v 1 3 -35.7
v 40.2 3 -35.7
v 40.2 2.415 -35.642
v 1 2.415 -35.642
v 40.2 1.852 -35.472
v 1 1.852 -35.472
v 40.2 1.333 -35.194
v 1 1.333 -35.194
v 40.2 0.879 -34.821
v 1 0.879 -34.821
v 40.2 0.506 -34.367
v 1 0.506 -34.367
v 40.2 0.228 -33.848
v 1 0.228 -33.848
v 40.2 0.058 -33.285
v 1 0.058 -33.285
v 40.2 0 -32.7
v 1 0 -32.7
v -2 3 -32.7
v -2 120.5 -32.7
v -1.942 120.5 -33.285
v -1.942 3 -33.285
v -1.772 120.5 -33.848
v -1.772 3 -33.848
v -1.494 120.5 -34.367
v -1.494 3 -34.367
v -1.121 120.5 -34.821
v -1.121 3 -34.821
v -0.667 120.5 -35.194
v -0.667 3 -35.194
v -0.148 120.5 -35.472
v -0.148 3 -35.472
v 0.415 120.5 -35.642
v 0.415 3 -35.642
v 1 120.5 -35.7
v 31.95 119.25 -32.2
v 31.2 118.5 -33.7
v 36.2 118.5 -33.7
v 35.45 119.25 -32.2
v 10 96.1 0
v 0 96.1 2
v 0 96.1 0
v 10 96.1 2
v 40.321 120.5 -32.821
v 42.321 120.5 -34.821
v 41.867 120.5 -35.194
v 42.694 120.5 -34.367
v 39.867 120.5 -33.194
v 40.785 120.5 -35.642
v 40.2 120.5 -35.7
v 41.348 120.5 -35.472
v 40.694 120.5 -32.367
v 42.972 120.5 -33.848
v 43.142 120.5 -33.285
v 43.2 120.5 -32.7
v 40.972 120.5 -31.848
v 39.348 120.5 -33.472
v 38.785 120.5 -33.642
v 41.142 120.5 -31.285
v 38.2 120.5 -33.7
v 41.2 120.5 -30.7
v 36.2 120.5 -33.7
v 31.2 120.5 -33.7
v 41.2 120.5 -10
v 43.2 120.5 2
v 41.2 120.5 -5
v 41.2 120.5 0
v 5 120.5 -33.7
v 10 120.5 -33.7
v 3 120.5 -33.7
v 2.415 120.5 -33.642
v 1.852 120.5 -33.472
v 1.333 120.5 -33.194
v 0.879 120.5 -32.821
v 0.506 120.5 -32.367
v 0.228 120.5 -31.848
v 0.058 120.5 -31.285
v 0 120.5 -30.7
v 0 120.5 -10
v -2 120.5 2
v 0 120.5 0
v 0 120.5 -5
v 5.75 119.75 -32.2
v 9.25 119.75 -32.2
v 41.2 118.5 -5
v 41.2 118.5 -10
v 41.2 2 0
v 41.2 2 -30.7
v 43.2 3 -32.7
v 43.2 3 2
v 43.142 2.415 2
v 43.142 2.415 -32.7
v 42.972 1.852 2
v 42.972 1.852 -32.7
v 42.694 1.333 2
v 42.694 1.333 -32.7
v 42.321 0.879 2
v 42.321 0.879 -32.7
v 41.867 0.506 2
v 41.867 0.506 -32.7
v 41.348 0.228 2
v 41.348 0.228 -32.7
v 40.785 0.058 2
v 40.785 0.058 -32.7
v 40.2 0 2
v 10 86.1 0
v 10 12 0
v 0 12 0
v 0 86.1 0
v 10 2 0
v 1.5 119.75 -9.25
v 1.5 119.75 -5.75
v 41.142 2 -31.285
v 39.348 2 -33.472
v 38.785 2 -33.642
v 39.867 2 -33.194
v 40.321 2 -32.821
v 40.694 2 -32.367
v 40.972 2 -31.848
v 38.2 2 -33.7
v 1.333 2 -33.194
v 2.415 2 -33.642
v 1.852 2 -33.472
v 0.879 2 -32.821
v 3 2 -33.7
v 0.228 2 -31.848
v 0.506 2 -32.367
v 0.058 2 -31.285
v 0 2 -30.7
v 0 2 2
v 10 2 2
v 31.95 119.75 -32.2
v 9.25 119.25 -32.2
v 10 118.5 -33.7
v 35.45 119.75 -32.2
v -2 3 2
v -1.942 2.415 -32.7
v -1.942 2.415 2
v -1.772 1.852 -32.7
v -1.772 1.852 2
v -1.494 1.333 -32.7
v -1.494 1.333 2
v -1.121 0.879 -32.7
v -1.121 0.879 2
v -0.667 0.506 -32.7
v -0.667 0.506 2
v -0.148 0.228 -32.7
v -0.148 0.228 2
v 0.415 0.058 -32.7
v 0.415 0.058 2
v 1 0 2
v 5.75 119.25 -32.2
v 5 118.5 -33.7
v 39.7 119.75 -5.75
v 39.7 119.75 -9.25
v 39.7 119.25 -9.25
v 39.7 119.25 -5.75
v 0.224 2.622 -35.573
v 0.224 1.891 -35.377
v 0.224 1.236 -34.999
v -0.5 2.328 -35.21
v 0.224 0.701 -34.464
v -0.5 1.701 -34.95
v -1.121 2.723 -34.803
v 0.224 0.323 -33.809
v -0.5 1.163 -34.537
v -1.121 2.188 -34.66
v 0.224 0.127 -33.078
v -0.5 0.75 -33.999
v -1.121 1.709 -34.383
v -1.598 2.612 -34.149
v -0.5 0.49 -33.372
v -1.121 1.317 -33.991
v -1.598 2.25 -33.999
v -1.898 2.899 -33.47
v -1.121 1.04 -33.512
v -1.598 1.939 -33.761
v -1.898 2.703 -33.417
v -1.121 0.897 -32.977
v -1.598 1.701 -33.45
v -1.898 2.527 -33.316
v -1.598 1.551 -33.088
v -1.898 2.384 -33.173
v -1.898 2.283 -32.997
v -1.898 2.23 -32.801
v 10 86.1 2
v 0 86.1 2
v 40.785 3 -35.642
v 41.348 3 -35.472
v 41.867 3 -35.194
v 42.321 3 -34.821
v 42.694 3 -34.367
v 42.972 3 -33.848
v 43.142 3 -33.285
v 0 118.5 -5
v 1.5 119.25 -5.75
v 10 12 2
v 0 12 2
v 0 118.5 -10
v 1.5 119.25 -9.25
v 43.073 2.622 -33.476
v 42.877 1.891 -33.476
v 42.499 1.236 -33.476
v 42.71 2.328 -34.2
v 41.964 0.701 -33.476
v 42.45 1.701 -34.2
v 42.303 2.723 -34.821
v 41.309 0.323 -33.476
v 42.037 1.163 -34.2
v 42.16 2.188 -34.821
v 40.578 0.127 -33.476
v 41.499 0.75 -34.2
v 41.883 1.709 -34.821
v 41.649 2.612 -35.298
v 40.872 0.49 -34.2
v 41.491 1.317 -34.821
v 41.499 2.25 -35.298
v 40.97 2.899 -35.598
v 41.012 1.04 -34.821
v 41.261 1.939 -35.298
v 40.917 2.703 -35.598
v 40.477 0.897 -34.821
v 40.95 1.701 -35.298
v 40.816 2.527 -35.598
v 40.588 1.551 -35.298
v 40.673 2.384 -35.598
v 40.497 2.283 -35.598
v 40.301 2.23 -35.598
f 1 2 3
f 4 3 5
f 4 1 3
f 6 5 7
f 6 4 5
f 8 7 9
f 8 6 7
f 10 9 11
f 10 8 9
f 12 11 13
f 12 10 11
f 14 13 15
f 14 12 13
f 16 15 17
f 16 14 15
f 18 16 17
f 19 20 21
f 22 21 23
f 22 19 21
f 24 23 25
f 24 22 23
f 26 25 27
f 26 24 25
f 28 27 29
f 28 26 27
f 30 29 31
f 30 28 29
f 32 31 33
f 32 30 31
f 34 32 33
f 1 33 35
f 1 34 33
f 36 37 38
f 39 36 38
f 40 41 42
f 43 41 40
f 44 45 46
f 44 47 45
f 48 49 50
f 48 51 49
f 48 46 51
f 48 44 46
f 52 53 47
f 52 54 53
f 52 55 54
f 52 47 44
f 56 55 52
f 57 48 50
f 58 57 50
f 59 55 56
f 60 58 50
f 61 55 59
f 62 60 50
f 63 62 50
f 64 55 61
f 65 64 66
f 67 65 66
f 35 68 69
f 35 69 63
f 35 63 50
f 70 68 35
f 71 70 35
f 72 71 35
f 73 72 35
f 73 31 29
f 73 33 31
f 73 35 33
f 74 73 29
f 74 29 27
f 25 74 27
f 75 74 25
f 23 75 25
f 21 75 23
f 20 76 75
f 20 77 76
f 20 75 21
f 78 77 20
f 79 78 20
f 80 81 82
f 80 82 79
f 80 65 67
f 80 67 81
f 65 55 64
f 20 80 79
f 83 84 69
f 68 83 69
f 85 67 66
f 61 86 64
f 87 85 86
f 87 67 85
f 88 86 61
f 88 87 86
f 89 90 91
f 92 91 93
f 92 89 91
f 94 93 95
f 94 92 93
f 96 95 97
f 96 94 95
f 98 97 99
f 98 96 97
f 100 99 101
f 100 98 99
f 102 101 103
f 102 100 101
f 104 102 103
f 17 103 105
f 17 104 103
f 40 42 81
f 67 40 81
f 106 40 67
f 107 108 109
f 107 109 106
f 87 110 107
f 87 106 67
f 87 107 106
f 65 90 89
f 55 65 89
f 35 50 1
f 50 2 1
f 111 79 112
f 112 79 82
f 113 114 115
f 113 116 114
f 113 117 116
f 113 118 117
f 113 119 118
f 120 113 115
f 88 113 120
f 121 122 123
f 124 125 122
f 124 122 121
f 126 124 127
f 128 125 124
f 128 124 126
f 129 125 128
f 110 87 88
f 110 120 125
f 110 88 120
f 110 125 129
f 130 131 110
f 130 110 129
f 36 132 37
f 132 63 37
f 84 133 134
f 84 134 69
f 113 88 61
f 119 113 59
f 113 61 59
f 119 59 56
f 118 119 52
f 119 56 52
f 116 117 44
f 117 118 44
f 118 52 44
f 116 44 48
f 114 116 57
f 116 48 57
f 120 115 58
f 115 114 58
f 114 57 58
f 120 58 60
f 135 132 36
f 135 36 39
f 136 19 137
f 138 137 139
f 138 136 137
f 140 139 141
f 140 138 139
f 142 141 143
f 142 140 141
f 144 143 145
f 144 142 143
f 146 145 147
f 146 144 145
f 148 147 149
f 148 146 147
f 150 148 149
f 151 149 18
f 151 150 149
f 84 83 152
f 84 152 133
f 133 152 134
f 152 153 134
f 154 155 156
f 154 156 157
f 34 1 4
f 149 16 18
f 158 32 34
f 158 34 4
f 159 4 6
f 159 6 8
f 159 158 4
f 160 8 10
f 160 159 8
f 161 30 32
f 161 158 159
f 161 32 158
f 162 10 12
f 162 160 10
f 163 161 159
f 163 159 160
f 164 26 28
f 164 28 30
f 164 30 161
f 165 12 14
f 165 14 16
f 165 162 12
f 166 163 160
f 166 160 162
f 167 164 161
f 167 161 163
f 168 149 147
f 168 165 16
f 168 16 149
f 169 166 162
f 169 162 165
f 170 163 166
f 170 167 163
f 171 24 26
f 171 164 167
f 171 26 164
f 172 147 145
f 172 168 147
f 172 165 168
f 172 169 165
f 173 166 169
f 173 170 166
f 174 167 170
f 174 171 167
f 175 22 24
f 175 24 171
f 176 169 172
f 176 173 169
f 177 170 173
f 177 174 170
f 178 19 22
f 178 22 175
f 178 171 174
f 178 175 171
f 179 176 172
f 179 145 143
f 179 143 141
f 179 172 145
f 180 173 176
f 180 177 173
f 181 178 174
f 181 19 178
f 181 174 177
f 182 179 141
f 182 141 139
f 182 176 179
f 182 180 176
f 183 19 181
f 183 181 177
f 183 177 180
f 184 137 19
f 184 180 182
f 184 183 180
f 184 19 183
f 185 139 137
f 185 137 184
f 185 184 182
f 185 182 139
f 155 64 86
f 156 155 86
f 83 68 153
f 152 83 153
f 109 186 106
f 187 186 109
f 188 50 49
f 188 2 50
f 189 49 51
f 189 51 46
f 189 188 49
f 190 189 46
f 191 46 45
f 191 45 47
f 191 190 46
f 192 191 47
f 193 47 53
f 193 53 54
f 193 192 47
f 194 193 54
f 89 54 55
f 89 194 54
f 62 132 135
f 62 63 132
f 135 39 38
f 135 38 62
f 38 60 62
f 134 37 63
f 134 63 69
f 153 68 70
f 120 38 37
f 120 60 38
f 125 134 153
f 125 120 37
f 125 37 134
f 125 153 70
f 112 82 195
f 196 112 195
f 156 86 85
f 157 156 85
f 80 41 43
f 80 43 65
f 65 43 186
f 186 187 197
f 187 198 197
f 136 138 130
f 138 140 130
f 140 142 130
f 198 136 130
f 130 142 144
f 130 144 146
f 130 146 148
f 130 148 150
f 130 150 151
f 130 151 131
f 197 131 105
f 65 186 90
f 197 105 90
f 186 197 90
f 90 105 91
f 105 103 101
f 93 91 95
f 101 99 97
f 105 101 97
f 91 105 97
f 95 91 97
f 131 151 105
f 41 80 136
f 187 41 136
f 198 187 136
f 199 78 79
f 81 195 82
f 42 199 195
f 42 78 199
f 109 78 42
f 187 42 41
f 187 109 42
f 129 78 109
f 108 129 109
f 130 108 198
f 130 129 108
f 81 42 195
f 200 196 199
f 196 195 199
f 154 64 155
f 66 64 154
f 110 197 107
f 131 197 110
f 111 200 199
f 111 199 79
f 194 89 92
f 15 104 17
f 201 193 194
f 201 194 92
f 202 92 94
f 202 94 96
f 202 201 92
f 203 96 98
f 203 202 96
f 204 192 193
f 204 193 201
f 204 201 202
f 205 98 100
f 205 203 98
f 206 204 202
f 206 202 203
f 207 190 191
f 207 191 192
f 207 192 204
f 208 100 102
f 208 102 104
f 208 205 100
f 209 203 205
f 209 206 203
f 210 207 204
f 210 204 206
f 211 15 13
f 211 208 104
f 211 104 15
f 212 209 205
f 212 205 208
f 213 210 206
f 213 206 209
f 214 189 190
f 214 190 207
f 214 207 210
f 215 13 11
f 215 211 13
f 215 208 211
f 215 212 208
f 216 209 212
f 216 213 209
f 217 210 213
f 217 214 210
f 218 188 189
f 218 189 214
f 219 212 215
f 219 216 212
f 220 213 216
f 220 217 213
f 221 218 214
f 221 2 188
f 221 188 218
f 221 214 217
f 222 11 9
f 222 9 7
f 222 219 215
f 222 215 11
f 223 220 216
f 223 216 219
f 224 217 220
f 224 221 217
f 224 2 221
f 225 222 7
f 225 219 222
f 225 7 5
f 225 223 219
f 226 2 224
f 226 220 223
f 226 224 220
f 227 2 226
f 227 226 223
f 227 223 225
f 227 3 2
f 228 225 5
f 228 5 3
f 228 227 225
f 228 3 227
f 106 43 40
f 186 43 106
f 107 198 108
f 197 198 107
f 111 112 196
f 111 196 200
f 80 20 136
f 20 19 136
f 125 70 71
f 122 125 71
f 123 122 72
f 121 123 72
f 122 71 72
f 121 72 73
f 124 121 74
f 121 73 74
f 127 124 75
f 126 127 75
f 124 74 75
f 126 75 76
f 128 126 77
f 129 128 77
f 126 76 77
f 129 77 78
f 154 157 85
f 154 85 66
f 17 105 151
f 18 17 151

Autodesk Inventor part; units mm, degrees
ref_plane "YZ Plane" through (0, 0, 0) normal (1, 0, 0) x (0, 1, 0)
sketch "Sketch1" plane through (0, 0, 0) normal (0, 1, 0) x (-1, 0, 0)
  line L0 (0, 0) -> (-41.2, 0)
  line L1 (-41.2, 0) -> (-41.2, -33.7)
  line L2 (-41.2, -33.7) -> (0, -33.7)
  line L3 (0, -33.7) -> (0, 0)
  line L4 (2, 2) -> (-43.2, 2)
  line L5 (-43.2, 2) -> (-43.2, -35.7)
  line L6 (-43.2, -35.7) -> (2, -35.7)
  line L7 (2, -35.7) -> (2, 2)
  dimension "d0" = 33.7
  dimension "d1" = 41.2
  dimension "d2" = 2
  dimension "d3" = 2
  dimension "d4" = 2
  dimension "d5" = 2
extrude "Extrusion1" add sketch "Sketch1" along normal blind 2 contours L3 L2 L1 L0
extrude "Extrusion2" add sketch "Sketch1" along normal blind 120.5
sketch "Sketch2" plane through (41.2, 2, 0) normal (0, 0, -1) x (-1, 0, 0)
  line L0 (43.2, 118.5) -> (-2, 118.5) projected
  line L1 (36.2, 118.5) -> (31.2, 118.5)
  line L2 (31.2, 118.5) -> (31.2, 116.5)
  line L3 (31.2, 116.5) -> (36.2, 116.5)
  line L4 (36.2, 116.5) -> (36.2, 118.5)
  line L5 (41.2, 0) -> (41.2, 118.5) projected
  point P0 (41.2, -2)
  point P1 (31.2, 118.5)
  dimension "d10" = 5
  dimension "d11" = 2
  dimension "d12" = 5
sketch "Sketch3" plane through (41.2, 2, 0) normal (-1, 0, 0) x (0, 0, 1)
  point P0 (0, -2)
sketch "Sketch4" plane through (41.2, 2, 0) normal (-1, 0, 0) x (0, 0, 1)
  line L0 (2, 118.5) -> (-35.7, 118.5) projected
  line L1 (-5, 118.5) -> (-10, 118.5)
  line L2 (-10, 118.5) -> (-10, 116.5)
  line L3 (-10, 116.5) -> (-5, 116.5)
  line L4 (-5, 116.5) -> (-5, 118.5)
  line L5 (0, 0) -> (0, 118.5) projected
  point P0 (0, -2)
  dimension "d27" = 5
  dimension "d28" = 2
  dimension "d29" = 5
extrude "Extrusion4" add sketch "Sketch4" along normal blind 1.5
chamfer "Chamfer5" distance 0.75 distance2 1.5 1 edges at (39.7, 120.5, -7.5) measured on face at (39.7, 119.1667, -6.6667)
chamfer "Chamfer6" distance 0.75 distance2 1.5 1 edges at (39.7, 119.125, -10) measured on face at (39.7, 118.9167, -6.6667)
chamfer "Chamfer7" distance 0.75 distance2 1.5 1 edges at (39.7, 118.5, -7.1251) measured on face at (39.7, 119.3333, -7.8334)
chamfer "Chamfer8" distance 0.75 distance2 1.5 1 edges at (39.7, 119.5, -5) measured on face at (39.7, 119.5833, -6.4167)
sketch "Sketch5" plane through (0, 2, -33.7) normal (0, 0, 1) x (1, 0, 0)
  line L0 (0, 118.5) -> (41.2, 118.5) projected
  line L1 (36.2, 118.5) -> (31.2, 118.5)
  line L2 (31.2, 118.5) -> (31.2, 116.5)
  line L3 (31.2, 116.5) -> (36.2, 116.5)
  line L4 (36.2, 116.5) -> (36.2, 118.5)
  line L5 (41.2, 0) -> (41.2, 118.5) projected
  point P0 (0, -2)
  point P1 (31.2, 118.5)
  dimension "d45" = 5
  dimension "d46" = 2
  dimension "d47" = 5
extrude "Extrusion5" add sketch "Sketch5" along normal blind 1.5
chamfer "Chamfer9" distance 0.75 distance2 1.5 1 edges at (33.7, 120.5, -32.2) measured on face at (34.5333, 119.1667, -32.2)
chamfer "Chamfer10" distance 0.75 distance2 1.5 1 edges at (33.7, 118.5, -32.2) measured on face at (34.5333, 118.9167, -32.2)
chamfer "Chamfer11" distance 0.75 distance2 1.5 1 edges at (31.2, 119.4999, -32.2) measured on face at (34.5333, 119.4166, -32.2)
chamfer "Chamfer12" distance 0.75 distance2 1.5 1 edges at (36.2, 119.4999, -32.2) measured on face at (34.7833, 119.4166, -32.2)
ref_plane "Work Plane2" through (17.8, 0, -35.7) normal (-1, 0, 0) x (0, 0, 1)
ref_plane "Work Plane3" through (20.6, 0, 2) normal (1, 0, 0) x (0, 0, -1)
mirror "Mirror1" about plane through (20.6, 0, 2) normal (1, 0, 0) of "Extrusion5", "Extrusion4", "Chamfer5", "Chamfer8", "Chamfer7", "Chamfer9", "Chamfer11", "Chamfer10", "Chamfer12", "Chamfer6"
fillet "Fillet2" radius 3 3 edges at (-2, 0, -16.85) (20.6, 0, -35.7) (43.2, 0, -16.85)
fillet "Fillet3" radius 3 4 edges at (-1.1213, 0.8787, -34.8213) (-2, 61.75, -35.7) (42.3213, 0.8787, -34.8213) (43.2, 61.75, -35.7)
fillet "Fillet4" radius 3 2 edges at (0, 61.25, -33.7) (41.2, 61.25, -33.7)
sketch "Sketch10" plane through (-2, 120.5, 2) normal (0, 0, 1) x (1, 0, 0)
  line L0 (2, -24.4) -> (12, -24.4)
  line L1 (12, -24.4) -> (12, -34.4)
  line L2 (12, -34.4) -> (2, -34.4)
  line L3 (2, -34.4) -> (2, -24.4)
  line L4 (3, -120.5) -> (42.2, -120.5) projected
  line L5 (2, -118.5) -> (2, 0) projected
  line L6 (0, 0) -> (45.2, 0) projected
  point P0 (2, -120.5)
  dimension "d88" = 10
  dimension "d89" = 10
  dimension "d90" = 24.4
extrude "Extrusion10" cut sketch "Sketch10" against normal blind 10
sketch "Sketch11" plane through (-2, 120.5, 2) normal (0, 0, 1) x (1, 0, 0)
  line L0 (2, -108.5) -> (12, -108.5)
  line L1 (12, -108.5) -> (12, -118.5)
  line L2 (12, -118.5) -> (2, -118.5)
  line L3 (2, -118.5) -> (2, -108.5)
  line L4 (0, -117.5) -> (0, 0) projected
  line L5 (3, -120.5) -> (42.2, -120.5) projected
  point P0 (2, -120.5)
  dimension "d95" = 2
  dimension "d96" = 2
  dimension "d97" = 10
  dimension "d98" = 10
extrude "Extrusion11" cut sketch "Sketch11" against normal blind 10
sketch "Sketch12" plane through (43.2, 3, 2) normal (1, 0, 0) x (0, 0, -1)
  line L0 (26.35, 103.4808) -> (11.35, 107.5)
  arc A0 (25.4441, 100.1) -> (26.35, 103.4808) centre (25.8971, 101.7904) ccw
  line L1 (25.4441, 100.1) -> (10.4441, 104.1193)
  arc A1 (11.35, 107.5) -> (10.4441, 104.1193) centre (10.8971, 105.8096) ccw
  line L2 (0, 117.5) -> (34.7, 117.5) projected
  line L3 (0, 117.5) -> (37.7, 117.5)
  line L4 (10.4441, 104.1193) -> (10.4441, 103.1193)
  line L5 (37.7, 0) -> (37.7, 117.5) projected
  line L6 (26.35, 87.9641) -> (11.35, 91.9833)
  arc A2 (25.4441, 84.5834) -> (26.35, 87.9641) centre (25.8971, 86.2737) ccw
  line L7 (25.4441, 84.5834) -> (10.4441, 88.6026)
  arc A3 (11.35, 91.9833) -> (10.4441, 88.6026) centre (10.8971, 90.293) ccw
  line L8 (10.4441, 88.6026) -> (10.4441, 87.6026)
  line L9 (26.35, 72.4474) -> (11.35, 76.4667)
  arc A4 (25.4441, 69.0667) -> (26.35, 72.4474) centre (25.8971, 70.7571) ccw
  line L10 (25.4441, 69.0667) -> (10.4441, 73.0859)
  arc A5 (11.35, 76.4667) -> (10.4441, 73.0859) centre (10.8971, 74.7763) ccw
  line L11 (10.4441, 73.0859) -> (10.4441, 72.0859)
  line L12 (26.35, 56.9308) -> (11.35, 60.95)
  arc A6 (25.4441, 53.55) -> (26.35, 56.9308) centre (25.8971, 55.2404) ccw
  line L13 (25.4441, 53.55) -> (10.4441, 57.5692)
  arc A7 (11.35, 60.95) -> (10.4441, 57.5692) centre (10.8971, 59.2596) ccw
  line L14 (10.4441, 57.5692) -> (10.4441, 56.5692)
  line L15 (26.35, 41.4141) -> (11.35, 45.4333)
  arc A8 (25.4441, 38.0333) -> (26.35, 41.4141) centre (25.8971, 39.7237) ccw
  line L16 (25.4441, 38.0333) -> (10.4441, 42.0526)
  arc A9 (11.35, 45.4333) -> (10.4441, 42.0526) centre (10.8971, 43.7429) ccw
  line L17 (10.4441, 42.0526) -> (10.4441, 41.0526)
  line L18 (26.35, 25.8974) -> (11.35, 29.9166)
  arc A10 (25.4441, 22.5167) -> (26.35, 25.8974) centre (25.8971, 24.207) ccw
  line L19 (25.4441, 22.5167) -> (10.4441, 26.5359)
  arc A11 (11.35, 29.9166) -> (10.4441, 26.5359) centre (10.8971, 28.2263) ccw
  line L20 (10.4441, 26.5359) -> (10.4441, 25.5359)
  line L21 (26.35, 10.3807) -> (11.35, 14.4)
  arc A12 (25.4441, 7) -> (26.35, 10.3807) centre (25.8971, 8.6904) ccw
  line L22 (25.4441, 7) -> (10.4441, 11.0192)
  arc A13 (11.35, 14.4) -> (10.4441, 11.0192) centre (10.8971, 12.7096) ccw
  line L23 (10.4441, 11.0192) -> (10.4441, 10.0192)
  line L24 (0, -3) -> (34.7, -3) projected
  point P0 (18.85, 105.4904)
  point P1 (18.85, 117.5)
  point P2 (18.85, 89.9737)
  point P3 (18.85, 74.457)
  point P4 (18.85, 58.9404)
  point P5 (18.85, 43.4237)
  point P6 (18.85, 27.907)
  point P7 (18.85, 12.3904)
  dimension "d113" = 15
  dimension "d114" = 3.5
  dimension "d115" = 1
  dimension "d116" = 75
  dimension "d117" = 10
  dimension "d120" = 15.5167
  dimension "d125" = 10
extrude "Extrusion12" [suppressed]
sketch "Sketch13" plane through (-2, 3, 2) normal (-1, 0, 0) x (0, 0, 1)
  line L0 (-9.85, 103.4808) -> (-24.85, 107.5)
  arc A0 (-10.7559, 100.1) -> (-9.85, 103.4808) centre (-10.3029, 101.7904) ccw
  line L1 (-10.7559, 100.1) -> (-25.7559, 104.1193)
  arc A1 (-24.85, 107.5) -> (-25.7559, 104.1193) centre (-25.3029, 105.8096) ccw
  line L2 (-25.7559, 104.1193) -> (-25.7559, 103.1193)
  line L3 (0, -3) -> (0, 117.5)
  line L4 (-9.85, 87.9641) -> (-24.85, 91.9833)
  arc A2 (-10.7559, 84.5834) -> (-9.85, 87.9641) centre (-10.3029, 86.2737) ccw
  line L5 (-10.7559, 84.5834) -> (-25.7559, 88.6026)
  arc A3 (-24.85, 91.9833) -> (-25.7559, 88.6026) centre (-25.3029, 90.293) ccw
  line L6 (-25.7559, 88.6026) -> (-25.7559, 87.6026)
  line L7 (-9.85, 72.4474) -> (-24.85, 76.4667)
  arc A4 (-10.7559, 69.0667) -> (-9.85, 72.4474) centre (-10.3029, 70.7571) ccw
  line L8 (-10.7559, 69.0667) -> (-25.7559, 73.0859)
  arc A5 (-24.85, 76.4667) -> (-25.7559, 73.0859) centre (-25.3029, 74.7763) ccw
  line L9 (-25.7559, 73.0859) -> (-25.7559, 72.0859)
  line L10 (-9.85, 56.9308) -> (-24.85, 60.95)
  arc A6 (-10.7559, 53.55) -> (-9.85, 56.9308) centre (-10.3029, 55.2404) ccw
  line L11 (-10.7559, 53.55) -> (-25.7559, 57.5692)
  arc A7 (-24.85, 60.95) -> (-25.7559, 57.5692) centre (-25.3029, 59.2596) ccw
  line L12 (-25.7559, 57.5692) -> (-25.7559, 56.5692)
  line L13 (-9.85, 41.4141) -> (-24.85, 45.4333)
  arc A8 (-10.7559, 38.0333) -> (-9.85, 41.4141) centre (-10.3029, 39.7237) ccw
  line L14 (-10.7559, 38.0333) -> (-25.7559, 42.0526)
  arc A9 (-24.85, 45.4333) -> (-25.7559, 42.0526) centre (-25.3029, 43.7429) ccw
  line L15 (-25.7559, 42.0526) -> (-25.7559, 41.0526)
  line L16 (-9.85, 25.8974) -> (-24.85, 29.9166)
  arc A10 (-10.7559, 22.5167) -> (-9.85, 25.8974) centre (-10.3029, 24.207) ccw
  line L17 (-10.7559, 22.5167) -> (-25.7559, 26.5359)
  arc A11 (-24.85, 29.9166) -> (-25.7559, 26.5359) centre (-25.3029, 28.2263) ccw
  line L18 (-25.7559, 26.5359) -> (-25.7559, 25.5359)
  line L19 (-9.85, 10.3807) -> (-24.85, 14.4)
  arc A12 (-10.7559, 7) -> (-9.85, 10.3807) centre (-10.3029, 8.6904) ccw
  line L20 (-10.7559, 7) -> (-25.7559, 11.0192)
  arc A13 (-24.85, 14.4) -> (-25.7559, 11.0192) centre (-25.3029, 12.7096) ccw
  line L21 (-25.7559, 11.0192) -> (-25.7559, 10.0192)
  line L22 (0, 0) -> (0, -3) projected
  line L23 (-34.7, 117.5) -> (0, 117.5) projected
  line L24 (-34.7, -3) -> (0, -3) projected
  line L25 (-37.7, 0) -> (-37.7, 117.5) projected
  line L26 (0, 0) -> (0, 117.5) projected
  line L27 (-37.7, 117.5) -> (0, 117.5)
  point P0 (-17.35, 105.4904)
  point P1 (-17.35, 89.9737)
  point P2 (-17.35, 74.457)
  point P3 (-17.35, 58.9404)
  point P4 (-17.35, 43.4237)
  point P5 (-17.35, 27.907)
  point P6 (-17.35, 12.3904)
  point P7 (-17.35, 117.5)
  dimension "d132" = 15
  dimension "d133" = 3.5
  dimension "d134" = 1
  dimension "d135" = 75
  dimension "d137" = 15.5167
  dimension "d140" = 10
  dimension "d141" = 10
extrude "Extrusion13" [suppressed]
properties part number "Batterihållare 2"
